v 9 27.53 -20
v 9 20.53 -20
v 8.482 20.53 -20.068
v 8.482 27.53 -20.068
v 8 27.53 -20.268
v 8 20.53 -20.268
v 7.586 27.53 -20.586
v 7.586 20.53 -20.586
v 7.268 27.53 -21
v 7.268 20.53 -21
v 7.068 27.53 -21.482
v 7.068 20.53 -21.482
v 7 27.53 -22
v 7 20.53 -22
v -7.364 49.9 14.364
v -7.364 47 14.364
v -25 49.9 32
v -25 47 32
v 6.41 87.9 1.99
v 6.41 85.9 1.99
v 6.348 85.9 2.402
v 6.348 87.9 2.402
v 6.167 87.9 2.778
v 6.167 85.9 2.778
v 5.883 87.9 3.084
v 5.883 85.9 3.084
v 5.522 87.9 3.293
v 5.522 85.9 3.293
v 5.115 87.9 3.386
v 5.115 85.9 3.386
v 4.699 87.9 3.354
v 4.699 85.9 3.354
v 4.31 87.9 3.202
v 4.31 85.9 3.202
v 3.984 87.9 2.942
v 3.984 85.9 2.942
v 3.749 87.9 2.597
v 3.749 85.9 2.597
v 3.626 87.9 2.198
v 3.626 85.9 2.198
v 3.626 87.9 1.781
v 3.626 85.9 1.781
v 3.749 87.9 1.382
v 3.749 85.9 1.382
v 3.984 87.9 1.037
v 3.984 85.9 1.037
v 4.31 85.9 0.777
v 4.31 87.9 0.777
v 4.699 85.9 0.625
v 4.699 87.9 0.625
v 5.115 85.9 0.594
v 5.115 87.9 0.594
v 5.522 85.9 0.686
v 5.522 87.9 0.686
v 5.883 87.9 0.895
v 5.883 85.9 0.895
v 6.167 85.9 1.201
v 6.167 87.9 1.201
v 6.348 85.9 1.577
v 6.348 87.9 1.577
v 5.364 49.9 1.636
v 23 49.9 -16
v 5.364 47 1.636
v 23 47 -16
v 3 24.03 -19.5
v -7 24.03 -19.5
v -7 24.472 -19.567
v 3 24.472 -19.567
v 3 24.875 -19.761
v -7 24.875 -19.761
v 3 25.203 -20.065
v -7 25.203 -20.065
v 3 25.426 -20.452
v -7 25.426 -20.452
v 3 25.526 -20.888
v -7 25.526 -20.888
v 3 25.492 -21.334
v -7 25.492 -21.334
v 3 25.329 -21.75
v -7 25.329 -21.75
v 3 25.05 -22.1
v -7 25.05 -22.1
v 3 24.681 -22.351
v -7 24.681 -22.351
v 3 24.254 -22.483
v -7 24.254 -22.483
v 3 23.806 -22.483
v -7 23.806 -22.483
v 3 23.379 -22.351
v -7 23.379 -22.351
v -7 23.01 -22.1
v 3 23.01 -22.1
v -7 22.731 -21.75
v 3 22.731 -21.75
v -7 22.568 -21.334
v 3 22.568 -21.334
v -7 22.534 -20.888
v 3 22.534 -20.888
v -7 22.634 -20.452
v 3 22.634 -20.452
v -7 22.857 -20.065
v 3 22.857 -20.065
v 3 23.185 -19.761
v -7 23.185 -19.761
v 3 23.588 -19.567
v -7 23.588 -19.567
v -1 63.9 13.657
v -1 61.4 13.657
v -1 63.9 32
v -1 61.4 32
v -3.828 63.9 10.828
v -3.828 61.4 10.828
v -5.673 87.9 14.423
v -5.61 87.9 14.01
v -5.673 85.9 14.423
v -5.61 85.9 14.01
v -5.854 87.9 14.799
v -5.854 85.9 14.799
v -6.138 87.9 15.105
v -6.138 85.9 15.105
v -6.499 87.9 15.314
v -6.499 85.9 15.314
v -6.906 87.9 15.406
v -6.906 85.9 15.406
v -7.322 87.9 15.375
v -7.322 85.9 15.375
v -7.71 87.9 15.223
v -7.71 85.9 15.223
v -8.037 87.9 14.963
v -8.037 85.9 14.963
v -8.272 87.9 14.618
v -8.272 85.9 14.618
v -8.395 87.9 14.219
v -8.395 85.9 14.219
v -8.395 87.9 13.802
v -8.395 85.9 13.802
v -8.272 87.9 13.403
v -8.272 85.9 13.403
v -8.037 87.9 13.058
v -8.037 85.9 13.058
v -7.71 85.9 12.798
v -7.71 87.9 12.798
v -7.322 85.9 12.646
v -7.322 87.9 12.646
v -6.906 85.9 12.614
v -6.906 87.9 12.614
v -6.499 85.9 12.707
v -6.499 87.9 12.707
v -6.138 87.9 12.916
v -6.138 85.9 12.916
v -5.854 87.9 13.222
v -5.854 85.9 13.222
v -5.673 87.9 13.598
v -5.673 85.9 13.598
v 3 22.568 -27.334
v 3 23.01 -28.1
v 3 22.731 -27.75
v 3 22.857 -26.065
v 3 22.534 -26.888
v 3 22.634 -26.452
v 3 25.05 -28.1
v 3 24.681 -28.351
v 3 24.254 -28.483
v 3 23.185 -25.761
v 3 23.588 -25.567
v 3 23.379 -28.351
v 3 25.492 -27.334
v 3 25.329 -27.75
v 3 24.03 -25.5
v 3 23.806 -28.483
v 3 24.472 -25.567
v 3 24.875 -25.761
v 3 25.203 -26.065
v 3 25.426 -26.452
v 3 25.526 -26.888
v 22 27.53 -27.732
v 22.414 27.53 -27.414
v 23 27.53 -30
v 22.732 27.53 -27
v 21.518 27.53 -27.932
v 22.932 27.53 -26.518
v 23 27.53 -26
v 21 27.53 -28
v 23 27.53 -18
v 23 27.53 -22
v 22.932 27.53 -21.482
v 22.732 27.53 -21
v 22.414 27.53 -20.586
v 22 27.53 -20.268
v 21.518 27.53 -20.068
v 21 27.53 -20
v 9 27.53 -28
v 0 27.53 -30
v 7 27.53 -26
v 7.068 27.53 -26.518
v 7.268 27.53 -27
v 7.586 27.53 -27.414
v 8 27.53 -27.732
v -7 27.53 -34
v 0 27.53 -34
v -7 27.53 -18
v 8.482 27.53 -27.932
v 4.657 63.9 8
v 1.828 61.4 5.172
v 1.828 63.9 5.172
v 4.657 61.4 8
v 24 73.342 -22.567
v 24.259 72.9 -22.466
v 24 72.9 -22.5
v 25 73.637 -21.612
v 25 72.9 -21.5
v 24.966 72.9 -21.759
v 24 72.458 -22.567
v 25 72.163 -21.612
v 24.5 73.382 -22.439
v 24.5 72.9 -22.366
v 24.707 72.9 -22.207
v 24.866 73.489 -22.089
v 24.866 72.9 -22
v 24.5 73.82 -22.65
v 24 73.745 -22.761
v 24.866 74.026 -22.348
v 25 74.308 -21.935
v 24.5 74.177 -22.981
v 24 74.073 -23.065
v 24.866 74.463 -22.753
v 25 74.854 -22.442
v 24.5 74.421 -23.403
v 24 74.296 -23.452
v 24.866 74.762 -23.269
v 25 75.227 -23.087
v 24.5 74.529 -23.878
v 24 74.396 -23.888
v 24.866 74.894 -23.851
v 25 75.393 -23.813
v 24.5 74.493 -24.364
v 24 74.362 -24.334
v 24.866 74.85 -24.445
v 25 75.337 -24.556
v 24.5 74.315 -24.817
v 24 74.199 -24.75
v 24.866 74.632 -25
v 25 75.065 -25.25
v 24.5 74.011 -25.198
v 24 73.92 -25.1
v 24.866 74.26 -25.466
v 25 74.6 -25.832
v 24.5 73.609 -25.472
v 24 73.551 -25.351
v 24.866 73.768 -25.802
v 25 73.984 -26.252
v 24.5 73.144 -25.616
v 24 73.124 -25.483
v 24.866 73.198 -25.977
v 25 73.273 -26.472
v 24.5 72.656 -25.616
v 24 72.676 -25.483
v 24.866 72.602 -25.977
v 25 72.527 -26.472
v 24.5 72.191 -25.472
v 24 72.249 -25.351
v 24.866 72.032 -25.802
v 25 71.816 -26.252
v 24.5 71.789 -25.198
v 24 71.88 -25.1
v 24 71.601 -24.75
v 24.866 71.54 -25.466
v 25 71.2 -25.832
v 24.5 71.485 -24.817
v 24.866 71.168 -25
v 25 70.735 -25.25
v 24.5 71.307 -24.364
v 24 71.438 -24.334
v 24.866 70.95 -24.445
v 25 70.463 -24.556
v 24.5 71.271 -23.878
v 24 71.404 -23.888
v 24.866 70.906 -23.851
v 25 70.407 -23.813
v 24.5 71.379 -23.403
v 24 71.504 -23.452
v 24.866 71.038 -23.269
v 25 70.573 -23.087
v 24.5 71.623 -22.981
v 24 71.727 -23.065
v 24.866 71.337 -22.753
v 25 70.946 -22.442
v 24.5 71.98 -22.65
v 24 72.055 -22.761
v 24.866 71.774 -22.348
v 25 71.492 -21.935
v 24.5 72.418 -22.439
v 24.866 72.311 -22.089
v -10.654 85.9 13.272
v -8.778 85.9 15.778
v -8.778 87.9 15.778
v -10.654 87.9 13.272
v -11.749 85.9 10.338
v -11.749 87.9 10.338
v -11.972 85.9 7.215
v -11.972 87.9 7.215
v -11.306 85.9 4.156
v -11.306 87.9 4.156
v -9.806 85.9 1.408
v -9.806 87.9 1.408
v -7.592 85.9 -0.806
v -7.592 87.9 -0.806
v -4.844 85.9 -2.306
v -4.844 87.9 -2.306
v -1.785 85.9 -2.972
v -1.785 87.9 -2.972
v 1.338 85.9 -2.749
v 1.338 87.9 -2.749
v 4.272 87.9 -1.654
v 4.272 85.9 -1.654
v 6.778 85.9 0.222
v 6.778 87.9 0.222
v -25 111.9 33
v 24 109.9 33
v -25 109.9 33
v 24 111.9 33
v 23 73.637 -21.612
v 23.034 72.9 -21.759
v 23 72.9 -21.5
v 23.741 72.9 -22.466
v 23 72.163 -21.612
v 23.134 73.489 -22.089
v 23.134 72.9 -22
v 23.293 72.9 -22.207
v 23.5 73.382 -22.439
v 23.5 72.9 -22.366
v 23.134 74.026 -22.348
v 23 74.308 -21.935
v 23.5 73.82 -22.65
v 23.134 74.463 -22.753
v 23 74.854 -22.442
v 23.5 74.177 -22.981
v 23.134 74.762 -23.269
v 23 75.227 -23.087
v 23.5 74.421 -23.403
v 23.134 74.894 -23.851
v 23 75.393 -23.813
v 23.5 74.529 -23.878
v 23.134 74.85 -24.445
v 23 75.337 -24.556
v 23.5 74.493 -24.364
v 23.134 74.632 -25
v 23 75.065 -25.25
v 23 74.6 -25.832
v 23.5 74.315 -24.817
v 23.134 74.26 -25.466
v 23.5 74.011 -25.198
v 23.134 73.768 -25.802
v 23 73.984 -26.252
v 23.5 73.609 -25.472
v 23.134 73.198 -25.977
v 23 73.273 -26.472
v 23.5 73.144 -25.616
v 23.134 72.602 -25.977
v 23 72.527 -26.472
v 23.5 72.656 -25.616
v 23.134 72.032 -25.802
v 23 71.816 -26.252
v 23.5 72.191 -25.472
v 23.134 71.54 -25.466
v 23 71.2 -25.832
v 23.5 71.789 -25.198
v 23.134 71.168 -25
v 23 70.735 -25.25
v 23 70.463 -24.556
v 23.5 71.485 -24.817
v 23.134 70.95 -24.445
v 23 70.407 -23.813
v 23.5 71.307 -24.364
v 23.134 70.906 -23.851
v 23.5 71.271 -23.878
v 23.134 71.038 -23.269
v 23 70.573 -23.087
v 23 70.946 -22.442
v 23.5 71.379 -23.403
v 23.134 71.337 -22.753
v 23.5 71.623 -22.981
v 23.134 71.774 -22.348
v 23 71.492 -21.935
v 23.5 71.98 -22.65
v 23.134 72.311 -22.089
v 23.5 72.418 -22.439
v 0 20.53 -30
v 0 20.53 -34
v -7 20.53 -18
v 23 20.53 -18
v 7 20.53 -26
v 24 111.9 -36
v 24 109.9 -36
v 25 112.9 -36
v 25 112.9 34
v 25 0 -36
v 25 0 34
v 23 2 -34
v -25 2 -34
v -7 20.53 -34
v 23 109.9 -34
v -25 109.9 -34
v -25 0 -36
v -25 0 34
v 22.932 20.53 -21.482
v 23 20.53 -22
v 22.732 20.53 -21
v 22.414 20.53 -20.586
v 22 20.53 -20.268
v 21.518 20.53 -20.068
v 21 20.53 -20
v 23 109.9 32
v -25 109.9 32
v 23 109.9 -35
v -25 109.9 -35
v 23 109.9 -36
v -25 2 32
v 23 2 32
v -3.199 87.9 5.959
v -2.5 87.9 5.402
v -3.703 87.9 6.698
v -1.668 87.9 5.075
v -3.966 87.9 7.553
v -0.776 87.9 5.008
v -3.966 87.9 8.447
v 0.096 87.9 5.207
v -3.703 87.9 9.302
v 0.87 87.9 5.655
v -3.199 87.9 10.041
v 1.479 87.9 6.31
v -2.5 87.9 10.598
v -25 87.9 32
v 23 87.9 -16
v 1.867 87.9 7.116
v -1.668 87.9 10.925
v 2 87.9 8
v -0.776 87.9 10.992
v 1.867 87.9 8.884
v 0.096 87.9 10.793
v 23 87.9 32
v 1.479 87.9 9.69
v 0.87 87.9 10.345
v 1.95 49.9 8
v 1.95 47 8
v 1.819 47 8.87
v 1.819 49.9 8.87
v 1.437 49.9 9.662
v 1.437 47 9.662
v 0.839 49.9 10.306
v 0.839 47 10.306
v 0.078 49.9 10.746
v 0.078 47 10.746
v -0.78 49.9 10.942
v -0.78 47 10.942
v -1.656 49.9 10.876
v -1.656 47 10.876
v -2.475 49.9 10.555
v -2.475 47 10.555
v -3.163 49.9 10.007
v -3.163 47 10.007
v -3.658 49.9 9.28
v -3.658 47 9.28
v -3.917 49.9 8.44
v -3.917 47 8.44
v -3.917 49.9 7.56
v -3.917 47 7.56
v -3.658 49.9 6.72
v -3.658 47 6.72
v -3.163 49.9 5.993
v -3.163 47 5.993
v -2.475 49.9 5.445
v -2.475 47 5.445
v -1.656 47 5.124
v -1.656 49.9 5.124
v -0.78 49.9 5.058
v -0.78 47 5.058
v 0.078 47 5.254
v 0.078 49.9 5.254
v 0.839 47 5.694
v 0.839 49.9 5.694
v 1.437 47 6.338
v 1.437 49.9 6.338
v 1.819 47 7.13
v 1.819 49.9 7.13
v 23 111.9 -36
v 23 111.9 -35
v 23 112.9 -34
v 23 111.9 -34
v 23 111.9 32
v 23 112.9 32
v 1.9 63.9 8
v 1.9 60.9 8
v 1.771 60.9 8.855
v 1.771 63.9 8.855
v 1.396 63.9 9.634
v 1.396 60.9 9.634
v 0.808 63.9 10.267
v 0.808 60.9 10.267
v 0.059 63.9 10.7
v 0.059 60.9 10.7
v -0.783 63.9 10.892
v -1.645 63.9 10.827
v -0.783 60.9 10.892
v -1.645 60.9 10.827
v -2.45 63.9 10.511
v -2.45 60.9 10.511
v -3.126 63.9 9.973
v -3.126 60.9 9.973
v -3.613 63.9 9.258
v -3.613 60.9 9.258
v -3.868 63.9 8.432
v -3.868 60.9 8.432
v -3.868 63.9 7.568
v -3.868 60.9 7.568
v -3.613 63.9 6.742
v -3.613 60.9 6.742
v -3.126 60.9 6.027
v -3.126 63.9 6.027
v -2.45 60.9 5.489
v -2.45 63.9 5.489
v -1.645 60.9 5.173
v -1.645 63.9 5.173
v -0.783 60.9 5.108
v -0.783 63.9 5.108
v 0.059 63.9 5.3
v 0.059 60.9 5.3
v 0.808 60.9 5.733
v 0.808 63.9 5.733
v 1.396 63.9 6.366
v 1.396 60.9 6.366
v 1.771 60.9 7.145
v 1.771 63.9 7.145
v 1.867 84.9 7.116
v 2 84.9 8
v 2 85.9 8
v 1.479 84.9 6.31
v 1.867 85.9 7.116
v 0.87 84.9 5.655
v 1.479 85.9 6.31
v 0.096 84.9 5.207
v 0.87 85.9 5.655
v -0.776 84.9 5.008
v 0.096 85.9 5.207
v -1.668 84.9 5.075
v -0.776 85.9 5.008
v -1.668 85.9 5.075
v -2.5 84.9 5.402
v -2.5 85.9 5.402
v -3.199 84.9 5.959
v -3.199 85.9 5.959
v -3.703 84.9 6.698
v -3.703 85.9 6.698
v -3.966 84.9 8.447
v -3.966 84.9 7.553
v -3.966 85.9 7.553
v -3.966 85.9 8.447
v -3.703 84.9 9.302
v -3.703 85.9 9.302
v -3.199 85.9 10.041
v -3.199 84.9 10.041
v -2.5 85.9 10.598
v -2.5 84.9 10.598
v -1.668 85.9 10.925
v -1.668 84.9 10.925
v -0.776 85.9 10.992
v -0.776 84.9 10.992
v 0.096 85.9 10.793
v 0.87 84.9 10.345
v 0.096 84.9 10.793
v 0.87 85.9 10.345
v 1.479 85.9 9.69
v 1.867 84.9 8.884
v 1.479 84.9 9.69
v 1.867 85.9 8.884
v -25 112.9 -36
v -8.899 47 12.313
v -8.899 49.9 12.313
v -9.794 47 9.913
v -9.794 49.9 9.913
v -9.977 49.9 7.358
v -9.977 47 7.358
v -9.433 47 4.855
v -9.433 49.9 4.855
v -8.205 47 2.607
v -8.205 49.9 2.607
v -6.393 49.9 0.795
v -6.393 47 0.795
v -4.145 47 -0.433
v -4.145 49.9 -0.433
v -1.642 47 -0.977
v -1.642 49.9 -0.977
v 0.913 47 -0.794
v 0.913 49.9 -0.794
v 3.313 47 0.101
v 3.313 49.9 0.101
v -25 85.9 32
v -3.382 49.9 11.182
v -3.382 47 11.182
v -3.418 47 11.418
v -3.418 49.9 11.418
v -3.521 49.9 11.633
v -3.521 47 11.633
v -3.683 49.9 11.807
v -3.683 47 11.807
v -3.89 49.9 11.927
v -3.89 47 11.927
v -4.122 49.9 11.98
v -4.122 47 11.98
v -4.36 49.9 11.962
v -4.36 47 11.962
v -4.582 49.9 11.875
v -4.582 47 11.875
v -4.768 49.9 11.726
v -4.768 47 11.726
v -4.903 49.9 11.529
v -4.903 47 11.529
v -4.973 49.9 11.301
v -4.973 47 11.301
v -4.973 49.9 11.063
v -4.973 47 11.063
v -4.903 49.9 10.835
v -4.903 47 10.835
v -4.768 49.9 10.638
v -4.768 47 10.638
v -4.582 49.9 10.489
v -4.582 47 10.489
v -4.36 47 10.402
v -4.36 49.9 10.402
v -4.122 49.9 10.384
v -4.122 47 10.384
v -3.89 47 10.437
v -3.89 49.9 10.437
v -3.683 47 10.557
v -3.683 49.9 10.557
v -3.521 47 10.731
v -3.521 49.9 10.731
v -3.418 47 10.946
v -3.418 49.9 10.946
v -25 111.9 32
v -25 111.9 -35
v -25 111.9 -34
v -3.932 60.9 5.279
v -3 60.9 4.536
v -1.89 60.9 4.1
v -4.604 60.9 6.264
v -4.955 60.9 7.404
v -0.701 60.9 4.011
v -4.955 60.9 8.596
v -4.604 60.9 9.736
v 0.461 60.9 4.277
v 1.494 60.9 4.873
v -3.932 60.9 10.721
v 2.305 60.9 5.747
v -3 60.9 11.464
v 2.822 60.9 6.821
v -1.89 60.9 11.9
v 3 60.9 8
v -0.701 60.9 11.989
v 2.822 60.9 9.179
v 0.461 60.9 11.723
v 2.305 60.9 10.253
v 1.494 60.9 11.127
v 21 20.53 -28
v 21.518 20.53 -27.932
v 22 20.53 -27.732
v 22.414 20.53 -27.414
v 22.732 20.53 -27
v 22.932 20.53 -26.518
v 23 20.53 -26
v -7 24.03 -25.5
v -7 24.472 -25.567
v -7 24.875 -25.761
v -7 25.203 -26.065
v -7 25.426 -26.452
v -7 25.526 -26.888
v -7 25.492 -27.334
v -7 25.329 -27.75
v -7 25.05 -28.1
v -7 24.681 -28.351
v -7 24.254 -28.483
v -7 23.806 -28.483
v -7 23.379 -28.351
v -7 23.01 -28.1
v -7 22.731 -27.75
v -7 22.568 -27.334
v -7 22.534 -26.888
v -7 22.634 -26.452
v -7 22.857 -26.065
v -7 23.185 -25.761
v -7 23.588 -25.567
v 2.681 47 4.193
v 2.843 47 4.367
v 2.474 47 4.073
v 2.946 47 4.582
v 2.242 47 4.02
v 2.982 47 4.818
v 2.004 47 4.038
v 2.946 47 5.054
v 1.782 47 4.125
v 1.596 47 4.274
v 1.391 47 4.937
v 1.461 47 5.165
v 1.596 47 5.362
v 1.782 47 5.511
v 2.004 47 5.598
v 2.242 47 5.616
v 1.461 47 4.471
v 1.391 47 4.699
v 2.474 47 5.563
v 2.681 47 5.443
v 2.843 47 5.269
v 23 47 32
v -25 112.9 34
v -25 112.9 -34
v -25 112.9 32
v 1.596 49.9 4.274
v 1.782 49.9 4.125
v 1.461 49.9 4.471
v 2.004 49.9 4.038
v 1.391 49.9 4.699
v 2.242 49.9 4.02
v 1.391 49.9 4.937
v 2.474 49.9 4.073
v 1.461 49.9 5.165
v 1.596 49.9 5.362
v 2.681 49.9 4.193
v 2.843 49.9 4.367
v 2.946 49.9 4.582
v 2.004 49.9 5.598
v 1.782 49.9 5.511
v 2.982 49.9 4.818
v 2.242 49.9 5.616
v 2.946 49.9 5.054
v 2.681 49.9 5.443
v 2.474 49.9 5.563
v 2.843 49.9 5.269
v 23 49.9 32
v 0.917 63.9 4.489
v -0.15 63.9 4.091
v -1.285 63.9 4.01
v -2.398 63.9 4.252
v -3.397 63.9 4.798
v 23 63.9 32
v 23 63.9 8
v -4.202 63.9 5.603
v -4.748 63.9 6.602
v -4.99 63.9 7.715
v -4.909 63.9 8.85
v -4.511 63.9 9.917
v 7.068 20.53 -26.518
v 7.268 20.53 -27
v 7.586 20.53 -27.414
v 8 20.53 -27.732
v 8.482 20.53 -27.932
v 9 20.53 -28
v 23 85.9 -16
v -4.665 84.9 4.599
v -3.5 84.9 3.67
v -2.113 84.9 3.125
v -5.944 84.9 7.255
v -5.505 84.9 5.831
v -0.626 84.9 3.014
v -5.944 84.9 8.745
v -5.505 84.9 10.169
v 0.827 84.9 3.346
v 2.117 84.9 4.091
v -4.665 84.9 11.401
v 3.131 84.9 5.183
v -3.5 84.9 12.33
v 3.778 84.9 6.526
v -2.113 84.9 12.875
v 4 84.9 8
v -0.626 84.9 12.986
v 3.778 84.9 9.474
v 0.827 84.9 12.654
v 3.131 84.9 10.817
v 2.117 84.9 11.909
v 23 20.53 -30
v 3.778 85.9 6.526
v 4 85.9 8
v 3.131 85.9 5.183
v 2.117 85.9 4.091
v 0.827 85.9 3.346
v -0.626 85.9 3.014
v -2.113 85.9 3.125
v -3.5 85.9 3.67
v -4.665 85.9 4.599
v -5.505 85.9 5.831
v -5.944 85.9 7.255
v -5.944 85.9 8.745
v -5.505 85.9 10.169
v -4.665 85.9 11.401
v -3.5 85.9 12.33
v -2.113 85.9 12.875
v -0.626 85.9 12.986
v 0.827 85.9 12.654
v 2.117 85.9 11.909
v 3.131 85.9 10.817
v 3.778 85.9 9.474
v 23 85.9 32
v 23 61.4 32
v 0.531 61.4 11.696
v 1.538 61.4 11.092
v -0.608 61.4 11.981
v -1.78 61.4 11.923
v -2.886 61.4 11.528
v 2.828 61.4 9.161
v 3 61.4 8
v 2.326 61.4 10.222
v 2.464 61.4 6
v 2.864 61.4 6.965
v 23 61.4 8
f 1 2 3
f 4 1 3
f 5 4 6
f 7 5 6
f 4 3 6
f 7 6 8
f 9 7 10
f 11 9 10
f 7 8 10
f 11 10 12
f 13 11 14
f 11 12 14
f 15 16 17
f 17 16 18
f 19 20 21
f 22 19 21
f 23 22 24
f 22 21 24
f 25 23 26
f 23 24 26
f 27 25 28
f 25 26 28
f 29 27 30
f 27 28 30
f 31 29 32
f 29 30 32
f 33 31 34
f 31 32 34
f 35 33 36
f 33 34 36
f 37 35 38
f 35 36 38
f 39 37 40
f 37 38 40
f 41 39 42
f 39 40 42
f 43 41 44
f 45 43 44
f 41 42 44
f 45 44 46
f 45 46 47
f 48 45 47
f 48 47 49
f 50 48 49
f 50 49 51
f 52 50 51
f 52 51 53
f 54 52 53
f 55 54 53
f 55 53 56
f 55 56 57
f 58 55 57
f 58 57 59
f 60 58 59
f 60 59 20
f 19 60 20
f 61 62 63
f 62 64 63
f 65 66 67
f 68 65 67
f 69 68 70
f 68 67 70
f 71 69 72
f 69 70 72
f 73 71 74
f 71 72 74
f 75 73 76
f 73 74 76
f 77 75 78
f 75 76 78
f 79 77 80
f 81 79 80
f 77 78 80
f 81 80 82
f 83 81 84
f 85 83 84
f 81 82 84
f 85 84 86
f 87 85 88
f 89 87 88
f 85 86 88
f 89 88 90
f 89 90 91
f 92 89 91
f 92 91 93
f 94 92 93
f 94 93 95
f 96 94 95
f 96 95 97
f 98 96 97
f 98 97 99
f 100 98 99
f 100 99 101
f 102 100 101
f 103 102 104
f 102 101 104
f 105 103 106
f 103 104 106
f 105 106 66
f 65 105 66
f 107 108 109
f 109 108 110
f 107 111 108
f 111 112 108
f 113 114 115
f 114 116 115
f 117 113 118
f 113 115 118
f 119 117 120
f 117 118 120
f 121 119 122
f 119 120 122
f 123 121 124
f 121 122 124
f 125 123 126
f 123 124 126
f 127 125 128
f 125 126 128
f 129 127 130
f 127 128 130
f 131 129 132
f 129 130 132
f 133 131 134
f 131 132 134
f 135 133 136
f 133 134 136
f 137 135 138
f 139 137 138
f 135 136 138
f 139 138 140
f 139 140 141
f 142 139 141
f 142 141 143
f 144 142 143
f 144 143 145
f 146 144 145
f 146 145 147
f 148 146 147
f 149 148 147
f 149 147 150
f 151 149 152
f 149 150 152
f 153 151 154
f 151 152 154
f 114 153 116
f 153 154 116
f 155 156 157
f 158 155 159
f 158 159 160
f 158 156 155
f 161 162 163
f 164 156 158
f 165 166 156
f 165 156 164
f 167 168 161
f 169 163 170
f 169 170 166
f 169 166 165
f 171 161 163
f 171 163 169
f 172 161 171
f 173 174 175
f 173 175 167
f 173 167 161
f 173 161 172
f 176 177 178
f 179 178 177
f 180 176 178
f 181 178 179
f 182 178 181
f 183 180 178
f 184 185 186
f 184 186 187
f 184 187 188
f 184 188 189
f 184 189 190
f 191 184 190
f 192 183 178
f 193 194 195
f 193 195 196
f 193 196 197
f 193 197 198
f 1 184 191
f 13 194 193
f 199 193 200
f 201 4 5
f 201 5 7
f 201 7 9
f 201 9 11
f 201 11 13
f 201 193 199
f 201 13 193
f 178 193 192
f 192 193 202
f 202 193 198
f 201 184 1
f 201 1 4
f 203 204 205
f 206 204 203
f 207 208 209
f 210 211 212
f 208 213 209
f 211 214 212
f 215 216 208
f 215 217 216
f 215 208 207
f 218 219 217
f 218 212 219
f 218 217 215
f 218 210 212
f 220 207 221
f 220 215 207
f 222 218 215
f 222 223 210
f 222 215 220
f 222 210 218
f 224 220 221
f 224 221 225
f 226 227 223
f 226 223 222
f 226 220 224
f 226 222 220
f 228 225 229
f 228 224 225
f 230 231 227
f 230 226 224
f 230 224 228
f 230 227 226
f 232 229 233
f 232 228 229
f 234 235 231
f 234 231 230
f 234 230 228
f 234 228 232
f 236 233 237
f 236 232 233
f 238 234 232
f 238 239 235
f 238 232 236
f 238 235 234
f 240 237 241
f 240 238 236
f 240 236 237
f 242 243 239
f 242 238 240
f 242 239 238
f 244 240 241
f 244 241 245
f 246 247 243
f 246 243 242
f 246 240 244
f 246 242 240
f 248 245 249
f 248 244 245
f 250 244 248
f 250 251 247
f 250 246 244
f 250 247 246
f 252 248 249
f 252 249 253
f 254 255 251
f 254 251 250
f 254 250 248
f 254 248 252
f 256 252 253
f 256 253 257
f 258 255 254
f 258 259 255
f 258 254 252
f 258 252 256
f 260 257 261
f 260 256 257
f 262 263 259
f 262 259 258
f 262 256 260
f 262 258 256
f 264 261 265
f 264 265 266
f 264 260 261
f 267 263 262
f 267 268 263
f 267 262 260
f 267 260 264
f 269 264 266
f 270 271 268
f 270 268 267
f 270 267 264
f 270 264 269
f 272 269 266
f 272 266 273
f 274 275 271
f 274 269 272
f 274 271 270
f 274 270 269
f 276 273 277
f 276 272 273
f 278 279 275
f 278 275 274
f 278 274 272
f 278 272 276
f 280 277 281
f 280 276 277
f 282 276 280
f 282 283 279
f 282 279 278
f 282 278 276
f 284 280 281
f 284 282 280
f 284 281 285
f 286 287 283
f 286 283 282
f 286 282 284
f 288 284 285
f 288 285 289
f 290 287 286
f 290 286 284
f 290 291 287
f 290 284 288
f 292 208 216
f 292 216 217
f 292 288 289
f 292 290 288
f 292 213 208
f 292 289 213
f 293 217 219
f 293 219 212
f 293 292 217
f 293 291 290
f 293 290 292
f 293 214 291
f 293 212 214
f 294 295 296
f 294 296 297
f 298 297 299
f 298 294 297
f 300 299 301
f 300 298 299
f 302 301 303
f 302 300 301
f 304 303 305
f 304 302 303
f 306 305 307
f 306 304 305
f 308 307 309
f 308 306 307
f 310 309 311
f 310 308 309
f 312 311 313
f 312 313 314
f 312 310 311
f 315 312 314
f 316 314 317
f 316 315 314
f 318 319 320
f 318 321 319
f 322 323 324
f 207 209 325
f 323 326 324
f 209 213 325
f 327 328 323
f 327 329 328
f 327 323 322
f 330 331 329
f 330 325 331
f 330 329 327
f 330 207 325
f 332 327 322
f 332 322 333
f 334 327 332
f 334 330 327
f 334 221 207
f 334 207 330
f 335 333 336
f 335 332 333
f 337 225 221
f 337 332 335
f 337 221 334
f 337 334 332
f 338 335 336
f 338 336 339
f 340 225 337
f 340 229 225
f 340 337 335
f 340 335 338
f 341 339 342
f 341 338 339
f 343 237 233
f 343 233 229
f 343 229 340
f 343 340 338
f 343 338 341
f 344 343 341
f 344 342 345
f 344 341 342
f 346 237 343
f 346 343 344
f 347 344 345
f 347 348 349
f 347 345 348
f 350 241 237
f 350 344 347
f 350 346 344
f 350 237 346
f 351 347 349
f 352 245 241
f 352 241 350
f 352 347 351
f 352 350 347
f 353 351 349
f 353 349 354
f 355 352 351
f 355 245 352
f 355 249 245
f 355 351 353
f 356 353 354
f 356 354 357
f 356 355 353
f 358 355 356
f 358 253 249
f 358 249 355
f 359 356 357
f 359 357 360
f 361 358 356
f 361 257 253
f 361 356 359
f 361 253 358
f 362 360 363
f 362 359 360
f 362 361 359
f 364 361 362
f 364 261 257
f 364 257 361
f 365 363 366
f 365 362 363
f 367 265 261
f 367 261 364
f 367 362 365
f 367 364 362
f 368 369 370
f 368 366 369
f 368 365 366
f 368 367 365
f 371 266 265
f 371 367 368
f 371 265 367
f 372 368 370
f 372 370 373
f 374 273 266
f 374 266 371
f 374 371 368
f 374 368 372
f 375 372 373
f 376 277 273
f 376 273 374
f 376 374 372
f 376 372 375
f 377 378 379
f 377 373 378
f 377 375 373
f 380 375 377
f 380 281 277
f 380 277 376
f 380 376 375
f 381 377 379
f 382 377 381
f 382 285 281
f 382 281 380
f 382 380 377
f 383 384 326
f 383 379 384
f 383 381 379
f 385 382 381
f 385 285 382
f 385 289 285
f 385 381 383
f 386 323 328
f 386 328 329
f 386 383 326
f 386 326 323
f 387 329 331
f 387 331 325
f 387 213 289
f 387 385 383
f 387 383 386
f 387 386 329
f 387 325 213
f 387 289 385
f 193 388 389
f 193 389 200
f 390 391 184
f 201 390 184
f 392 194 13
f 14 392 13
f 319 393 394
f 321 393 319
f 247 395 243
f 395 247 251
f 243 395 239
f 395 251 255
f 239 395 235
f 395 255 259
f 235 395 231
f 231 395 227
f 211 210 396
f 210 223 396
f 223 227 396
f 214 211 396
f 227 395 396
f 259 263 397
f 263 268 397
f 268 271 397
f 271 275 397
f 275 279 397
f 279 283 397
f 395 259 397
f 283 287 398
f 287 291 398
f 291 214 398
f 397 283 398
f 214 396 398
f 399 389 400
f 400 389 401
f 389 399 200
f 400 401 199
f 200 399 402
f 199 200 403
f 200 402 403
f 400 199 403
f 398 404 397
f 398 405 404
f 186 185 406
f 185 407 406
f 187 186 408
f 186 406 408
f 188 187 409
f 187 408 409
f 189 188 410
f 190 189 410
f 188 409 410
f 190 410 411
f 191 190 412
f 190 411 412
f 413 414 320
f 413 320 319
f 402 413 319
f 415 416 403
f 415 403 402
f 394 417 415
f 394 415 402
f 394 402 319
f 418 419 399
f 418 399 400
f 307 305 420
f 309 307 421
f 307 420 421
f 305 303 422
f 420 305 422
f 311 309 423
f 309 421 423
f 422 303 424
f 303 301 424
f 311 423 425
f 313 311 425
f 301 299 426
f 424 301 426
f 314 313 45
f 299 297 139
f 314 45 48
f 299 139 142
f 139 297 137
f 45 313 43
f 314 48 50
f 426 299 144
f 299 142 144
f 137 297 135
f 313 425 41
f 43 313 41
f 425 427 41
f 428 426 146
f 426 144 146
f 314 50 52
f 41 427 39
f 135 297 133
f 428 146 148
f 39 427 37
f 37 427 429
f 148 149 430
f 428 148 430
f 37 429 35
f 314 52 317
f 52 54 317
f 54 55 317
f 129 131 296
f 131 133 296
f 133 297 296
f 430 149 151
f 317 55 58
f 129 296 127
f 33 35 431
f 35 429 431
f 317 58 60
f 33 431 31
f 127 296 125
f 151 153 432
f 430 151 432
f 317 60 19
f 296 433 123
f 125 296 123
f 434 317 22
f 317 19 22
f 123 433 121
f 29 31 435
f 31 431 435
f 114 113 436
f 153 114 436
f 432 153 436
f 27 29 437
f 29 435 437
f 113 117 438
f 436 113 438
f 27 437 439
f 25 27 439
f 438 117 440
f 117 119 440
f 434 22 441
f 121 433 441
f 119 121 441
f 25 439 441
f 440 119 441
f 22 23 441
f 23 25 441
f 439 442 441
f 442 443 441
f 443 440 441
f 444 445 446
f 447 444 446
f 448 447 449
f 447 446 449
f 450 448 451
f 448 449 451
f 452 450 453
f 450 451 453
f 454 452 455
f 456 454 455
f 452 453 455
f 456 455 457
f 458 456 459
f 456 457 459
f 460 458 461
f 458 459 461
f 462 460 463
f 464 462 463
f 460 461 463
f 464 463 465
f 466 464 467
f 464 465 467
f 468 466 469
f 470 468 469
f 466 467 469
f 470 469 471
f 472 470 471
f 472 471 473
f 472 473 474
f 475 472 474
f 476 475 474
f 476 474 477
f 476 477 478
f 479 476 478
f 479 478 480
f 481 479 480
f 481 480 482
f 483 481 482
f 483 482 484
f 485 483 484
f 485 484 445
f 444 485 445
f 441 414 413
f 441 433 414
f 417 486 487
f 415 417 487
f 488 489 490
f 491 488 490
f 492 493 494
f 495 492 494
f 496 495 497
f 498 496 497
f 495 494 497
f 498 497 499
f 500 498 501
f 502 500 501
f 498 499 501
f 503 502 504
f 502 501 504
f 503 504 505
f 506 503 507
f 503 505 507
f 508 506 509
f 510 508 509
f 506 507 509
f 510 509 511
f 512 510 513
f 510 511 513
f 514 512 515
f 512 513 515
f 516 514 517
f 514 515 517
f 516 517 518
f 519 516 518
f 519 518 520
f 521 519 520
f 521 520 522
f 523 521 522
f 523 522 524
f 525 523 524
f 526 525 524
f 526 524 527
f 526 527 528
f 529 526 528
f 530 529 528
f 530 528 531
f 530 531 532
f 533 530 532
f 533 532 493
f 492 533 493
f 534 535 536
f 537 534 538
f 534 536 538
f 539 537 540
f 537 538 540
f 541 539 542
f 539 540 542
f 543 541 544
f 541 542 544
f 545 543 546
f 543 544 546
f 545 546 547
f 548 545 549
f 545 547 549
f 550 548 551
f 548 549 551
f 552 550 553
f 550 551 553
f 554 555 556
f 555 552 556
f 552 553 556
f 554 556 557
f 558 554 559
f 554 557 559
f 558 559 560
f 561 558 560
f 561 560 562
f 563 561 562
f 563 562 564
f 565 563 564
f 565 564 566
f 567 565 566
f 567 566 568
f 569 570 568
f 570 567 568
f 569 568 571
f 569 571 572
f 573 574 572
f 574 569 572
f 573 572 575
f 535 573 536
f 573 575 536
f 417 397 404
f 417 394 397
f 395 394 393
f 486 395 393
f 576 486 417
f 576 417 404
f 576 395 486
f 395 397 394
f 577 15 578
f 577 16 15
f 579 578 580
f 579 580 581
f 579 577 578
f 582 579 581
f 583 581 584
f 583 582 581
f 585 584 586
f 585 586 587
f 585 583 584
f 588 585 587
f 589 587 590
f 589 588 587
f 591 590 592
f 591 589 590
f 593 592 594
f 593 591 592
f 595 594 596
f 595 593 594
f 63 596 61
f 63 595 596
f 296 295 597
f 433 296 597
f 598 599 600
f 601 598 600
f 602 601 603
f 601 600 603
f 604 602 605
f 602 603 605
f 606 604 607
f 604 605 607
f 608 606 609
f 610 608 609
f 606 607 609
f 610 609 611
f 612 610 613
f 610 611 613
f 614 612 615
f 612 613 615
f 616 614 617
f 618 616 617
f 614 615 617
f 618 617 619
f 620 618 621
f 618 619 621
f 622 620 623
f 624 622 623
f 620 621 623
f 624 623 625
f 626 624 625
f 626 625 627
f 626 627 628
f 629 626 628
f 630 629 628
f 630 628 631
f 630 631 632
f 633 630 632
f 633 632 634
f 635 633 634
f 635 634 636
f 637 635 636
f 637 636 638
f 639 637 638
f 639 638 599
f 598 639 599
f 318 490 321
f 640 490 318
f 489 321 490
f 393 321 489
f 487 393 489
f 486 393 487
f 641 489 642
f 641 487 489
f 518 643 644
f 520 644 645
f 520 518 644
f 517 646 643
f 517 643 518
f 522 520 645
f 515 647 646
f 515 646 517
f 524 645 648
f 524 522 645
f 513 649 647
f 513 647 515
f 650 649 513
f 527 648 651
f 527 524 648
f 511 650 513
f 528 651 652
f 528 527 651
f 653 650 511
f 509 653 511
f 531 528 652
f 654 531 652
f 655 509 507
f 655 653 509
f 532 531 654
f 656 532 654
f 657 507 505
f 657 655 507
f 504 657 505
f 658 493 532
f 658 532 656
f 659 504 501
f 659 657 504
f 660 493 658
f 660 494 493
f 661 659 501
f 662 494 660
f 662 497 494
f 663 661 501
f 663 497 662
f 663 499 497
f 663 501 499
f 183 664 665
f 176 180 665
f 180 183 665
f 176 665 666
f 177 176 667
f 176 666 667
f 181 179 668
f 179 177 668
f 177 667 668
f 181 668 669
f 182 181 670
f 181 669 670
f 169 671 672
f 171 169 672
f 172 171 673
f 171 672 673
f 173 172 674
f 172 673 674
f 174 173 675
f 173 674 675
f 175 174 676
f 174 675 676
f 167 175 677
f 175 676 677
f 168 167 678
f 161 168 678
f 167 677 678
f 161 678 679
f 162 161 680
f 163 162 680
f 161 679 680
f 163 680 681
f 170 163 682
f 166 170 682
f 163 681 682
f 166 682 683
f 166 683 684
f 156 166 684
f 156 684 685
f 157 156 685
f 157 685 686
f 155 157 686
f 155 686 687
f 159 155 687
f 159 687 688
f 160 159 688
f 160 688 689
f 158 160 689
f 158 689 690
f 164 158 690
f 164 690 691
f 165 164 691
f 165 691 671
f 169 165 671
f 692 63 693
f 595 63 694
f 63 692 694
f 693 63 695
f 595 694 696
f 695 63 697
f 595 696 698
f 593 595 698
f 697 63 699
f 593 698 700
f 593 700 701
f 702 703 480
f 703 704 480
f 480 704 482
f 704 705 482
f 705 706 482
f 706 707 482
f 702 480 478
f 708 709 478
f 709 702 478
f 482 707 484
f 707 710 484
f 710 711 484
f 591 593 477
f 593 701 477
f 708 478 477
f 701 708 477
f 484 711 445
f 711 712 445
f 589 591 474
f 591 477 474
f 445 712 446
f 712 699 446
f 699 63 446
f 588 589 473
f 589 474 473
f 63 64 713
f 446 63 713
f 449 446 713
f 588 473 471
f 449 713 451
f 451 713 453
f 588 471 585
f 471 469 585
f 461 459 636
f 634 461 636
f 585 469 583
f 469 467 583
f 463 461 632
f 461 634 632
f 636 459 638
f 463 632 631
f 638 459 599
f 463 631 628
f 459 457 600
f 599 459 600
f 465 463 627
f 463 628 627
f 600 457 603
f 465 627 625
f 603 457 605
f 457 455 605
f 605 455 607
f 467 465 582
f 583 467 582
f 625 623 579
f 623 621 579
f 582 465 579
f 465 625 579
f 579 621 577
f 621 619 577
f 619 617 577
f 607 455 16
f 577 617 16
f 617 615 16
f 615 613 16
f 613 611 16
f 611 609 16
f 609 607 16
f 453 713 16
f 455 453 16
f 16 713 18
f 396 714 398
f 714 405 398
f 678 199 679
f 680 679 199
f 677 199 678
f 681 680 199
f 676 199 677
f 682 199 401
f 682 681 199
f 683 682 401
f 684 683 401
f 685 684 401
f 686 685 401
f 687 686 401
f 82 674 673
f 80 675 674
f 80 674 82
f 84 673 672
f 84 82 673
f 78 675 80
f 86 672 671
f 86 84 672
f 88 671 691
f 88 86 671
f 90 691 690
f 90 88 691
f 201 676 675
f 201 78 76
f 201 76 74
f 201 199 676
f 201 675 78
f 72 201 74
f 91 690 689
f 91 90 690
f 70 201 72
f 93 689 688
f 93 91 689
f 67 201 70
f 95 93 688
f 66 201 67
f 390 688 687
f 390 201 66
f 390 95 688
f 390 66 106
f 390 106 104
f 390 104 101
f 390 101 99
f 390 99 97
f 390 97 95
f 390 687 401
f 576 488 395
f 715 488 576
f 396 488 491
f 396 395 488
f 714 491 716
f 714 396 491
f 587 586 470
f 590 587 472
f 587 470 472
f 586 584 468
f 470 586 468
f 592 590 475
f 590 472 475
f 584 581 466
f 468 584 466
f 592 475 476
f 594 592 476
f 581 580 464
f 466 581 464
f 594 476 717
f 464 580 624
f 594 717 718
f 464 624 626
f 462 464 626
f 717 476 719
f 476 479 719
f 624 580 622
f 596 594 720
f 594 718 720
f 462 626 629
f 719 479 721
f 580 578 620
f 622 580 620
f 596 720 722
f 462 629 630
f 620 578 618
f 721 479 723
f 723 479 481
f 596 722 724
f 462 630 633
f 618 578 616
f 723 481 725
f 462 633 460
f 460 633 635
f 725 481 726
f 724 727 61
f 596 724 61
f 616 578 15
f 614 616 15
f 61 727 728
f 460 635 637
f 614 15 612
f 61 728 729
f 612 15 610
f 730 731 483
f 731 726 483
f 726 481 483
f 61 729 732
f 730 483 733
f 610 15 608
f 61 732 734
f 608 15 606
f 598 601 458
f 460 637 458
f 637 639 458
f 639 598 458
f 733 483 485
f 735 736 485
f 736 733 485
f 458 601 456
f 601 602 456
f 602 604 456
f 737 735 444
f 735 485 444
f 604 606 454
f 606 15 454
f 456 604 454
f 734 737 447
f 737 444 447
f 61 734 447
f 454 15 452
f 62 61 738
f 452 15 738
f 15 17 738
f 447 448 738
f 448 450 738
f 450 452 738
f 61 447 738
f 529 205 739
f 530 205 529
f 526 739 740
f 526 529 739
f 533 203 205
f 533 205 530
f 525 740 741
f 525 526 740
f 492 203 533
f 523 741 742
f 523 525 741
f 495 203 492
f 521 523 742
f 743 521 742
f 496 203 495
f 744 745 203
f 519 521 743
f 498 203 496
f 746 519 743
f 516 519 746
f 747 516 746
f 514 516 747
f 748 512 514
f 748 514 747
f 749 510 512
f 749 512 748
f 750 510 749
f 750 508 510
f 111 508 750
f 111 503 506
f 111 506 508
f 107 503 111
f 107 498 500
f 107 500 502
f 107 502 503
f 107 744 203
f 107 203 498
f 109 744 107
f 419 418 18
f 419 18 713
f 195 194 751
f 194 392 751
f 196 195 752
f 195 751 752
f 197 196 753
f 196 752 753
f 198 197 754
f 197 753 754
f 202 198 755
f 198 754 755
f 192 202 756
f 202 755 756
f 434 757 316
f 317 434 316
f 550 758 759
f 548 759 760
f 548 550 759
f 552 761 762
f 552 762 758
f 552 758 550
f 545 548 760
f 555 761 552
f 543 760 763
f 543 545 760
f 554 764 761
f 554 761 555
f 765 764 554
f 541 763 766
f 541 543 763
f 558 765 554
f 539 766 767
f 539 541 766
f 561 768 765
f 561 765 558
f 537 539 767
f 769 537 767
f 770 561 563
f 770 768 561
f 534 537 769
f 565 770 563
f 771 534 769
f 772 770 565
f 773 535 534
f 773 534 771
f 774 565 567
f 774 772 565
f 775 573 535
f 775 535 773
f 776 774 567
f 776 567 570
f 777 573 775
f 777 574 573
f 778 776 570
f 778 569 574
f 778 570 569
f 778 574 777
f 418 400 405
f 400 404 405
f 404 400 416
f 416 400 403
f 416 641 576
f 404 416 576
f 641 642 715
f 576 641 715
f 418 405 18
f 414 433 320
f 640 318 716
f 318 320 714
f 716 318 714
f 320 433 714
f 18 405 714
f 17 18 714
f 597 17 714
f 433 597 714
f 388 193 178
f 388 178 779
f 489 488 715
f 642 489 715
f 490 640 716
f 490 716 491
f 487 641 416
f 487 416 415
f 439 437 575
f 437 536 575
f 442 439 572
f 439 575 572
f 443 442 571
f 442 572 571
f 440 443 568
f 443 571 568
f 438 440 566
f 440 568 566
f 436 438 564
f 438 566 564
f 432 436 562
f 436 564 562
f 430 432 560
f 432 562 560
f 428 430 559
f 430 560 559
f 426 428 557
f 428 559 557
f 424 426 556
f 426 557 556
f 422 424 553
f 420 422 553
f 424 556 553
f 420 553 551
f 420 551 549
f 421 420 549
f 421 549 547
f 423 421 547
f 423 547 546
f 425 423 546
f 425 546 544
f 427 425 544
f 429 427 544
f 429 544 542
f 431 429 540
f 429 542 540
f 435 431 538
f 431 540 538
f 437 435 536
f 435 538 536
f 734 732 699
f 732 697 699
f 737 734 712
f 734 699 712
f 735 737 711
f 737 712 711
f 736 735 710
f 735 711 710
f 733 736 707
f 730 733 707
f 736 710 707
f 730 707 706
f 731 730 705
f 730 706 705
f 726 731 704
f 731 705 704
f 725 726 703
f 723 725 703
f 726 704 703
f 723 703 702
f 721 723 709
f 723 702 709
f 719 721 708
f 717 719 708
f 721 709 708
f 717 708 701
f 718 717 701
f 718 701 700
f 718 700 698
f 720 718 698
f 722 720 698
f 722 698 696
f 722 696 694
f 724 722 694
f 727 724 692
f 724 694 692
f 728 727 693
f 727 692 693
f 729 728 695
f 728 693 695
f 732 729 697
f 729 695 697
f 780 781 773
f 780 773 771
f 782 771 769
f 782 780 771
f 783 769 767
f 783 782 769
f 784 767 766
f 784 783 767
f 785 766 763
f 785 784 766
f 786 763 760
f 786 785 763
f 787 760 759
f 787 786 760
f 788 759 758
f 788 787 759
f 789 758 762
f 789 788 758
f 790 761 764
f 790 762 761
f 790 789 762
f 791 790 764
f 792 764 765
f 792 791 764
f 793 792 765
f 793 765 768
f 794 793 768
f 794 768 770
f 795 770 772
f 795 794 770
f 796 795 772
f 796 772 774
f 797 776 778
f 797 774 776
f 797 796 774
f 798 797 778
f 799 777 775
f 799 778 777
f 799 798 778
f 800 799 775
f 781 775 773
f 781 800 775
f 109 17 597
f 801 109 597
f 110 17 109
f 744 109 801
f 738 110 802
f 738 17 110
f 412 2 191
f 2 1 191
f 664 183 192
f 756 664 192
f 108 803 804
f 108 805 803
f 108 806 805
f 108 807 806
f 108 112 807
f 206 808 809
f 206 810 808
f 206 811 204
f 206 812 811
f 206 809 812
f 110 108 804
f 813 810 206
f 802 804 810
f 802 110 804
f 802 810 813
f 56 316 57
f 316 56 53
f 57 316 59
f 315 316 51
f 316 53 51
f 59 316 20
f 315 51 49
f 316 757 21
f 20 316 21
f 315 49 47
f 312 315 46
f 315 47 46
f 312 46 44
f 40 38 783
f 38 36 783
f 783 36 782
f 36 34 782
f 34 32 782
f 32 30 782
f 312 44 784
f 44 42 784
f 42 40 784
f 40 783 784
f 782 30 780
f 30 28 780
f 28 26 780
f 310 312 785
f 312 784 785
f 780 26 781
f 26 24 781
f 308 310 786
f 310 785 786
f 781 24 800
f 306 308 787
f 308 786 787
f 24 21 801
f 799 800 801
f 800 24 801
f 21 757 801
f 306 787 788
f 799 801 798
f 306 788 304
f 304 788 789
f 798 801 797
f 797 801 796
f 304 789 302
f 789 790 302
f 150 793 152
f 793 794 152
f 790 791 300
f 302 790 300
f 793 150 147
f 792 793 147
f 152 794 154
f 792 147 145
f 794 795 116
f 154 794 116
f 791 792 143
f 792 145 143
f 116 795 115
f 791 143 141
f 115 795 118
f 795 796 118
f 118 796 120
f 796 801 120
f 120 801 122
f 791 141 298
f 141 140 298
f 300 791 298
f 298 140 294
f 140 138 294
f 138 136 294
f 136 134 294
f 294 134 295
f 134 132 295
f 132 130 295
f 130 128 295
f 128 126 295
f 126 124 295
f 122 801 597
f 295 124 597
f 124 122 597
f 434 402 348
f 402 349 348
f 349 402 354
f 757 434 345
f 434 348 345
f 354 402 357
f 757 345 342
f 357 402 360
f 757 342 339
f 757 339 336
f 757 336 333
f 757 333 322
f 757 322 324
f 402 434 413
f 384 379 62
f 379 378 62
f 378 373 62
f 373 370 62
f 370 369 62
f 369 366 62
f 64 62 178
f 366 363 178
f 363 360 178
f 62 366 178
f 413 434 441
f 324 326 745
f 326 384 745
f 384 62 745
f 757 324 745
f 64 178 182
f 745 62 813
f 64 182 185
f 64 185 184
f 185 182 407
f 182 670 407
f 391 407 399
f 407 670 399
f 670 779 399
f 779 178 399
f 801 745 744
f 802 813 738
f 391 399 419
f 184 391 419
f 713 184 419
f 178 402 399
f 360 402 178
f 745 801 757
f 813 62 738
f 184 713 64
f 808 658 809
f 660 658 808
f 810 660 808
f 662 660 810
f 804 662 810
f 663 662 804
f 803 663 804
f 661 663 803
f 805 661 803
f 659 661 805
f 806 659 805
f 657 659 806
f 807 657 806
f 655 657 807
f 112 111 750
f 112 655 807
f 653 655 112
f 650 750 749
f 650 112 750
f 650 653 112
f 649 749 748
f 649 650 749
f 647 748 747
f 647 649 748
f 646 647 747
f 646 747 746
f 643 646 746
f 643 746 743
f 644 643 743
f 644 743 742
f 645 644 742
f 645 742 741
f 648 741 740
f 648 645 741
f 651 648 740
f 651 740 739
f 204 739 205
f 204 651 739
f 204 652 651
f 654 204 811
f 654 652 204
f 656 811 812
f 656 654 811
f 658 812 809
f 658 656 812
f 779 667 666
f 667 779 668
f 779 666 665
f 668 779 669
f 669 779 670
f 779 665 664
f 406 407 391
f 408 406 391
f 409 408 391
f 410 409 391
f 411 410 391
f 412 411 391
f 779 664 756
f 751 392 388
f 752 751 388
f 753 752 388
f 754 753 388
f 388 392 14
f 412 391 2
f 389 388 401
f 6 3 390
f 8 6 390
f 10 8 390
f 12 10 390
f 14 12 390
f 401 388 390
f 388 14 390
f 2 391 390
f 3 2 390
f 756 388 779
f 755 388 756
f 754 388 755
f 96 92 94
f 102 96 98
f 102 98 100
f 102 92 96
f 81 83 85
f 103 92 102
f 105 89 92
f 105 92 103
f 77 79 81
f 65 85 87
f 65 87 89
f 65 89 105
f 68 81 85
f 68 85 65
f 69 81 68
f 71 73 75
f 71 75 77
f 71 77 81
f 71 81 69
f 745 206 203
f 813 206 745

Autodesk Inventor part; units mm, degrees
ref_plane "YZ Plane" through (0, 0, 0) normal (1, 0, 0) x (0, 1, 0)
ref_plane "XZ Plane" through (0, 0, 0) normal (0, 1, 0) x (-1, 0, 0)
ref_plane "XY Plane" through (0, 0, 0) normal (0, 0, 1) x (1, 0, 0)
sketch "Sketch1" plane through (0, 0, 0) normal (0, 1, 0) x (-1, 0, 0)
  line L0 (25, 34) -> (-25, 34)
  line L1 (-25, 34) -> (-25, -34)
  line L2 (-25, -34) -> (25, -34)
  line L3 (25, -34) -> (25, 34)
  line L4 (25, 34) -> (-25, -34) construction
  line L5 (-25, 34) -> (25, -34) construction
  point P0 (0, 0)
  dimension "d0" = 68
  dimension "d1" = 50
extrude "left wall" add sketch "Sketch1" along normal blind 2
sketch "Sketch3" plane through (0, 2, 0) normal (0, 1, 0) x (1, 0, 0)
  line L0 (25, -34) -> (25, 34) projected
  line L1 (-25, 34) -> (-25, -34) projected
  line L2 (25, -34) -> (-25, -34)
  line L3 (-25, -34) -> (-25, -32)
  line L4 (-25, -32) -> (25, -32)
  line L5 (25, -32) -> (25, -34)
  point P0 (0, 0)
  dimension "d4" = 2
extrude "bottom wall" add sketch "Sketch3" along normal blind 110.9
sketch "Sketch10" plane through (-25, 2, 32) normal (0, 0, -1) x (-1, 0, 0)
  line L0 (0, 0) -> (0, 110.9) projected
  line L1 (-50, 0) -> (-50, 110.9) projected
  line L2 (0, 58.9) -> (-50, 58.9)
  line L3 (-50, 58.9) -> (-50, 61.9)
  line L4 (-50, 61.9) -> (0, 61.9)
  line L5 (0, 61.9) -> (0, 58.9)
  line L6 (-50, 0) -> (0, 0) projected
  point P0 (-25, -2)
  point P1 (0, 61.9)
  point P2 (-50, 58.9)
  dimension "d33" = 3
  dimension "d34" = 58.9
extrude "mid wall" add sketch "Sketch10" along normal blind 48 contours L2 L1 L4 L0
sketch "Sketch11" plane through (-25, 60.9, 32) normal (0, -1, 0) x (1, 0, 0)
  circle A0 centre (24, -24) radius 2.9
  line L0 (0, 0) -> (0, -48) projected
  line L1 (0, -48) -> (50, -48) projected
  dimension "d37" = 5.8
  dimension "d136" = 24
  dimension "d137" = 24
extrude "middle bearing hole" cut sketch "Sketch11" against normal blind 48
sketch "Sketch15" plane through (0, 2, 0) normal (0, 1, 0) x (1, 0, 0)
  line L0 (25, 34) -> (-25, 34) projected
  line L1 (-25, -32) -> (25, -32) projected
  line L2 (25, 34) -> (23, 34)
  line L3 (23, 34) -> (23, -32)
  line L4 (23, -32) -> (25, -32)
  line L5 (25, -32) -> (25, 34)
  point P0 (0, 0)
  point P1 (25, -32)
  dimension "d69" = 2
extrude "back wall" add sketch "Sketch15" along normal blind 110.9
sketch "Sketch20" plane through (-25, 60.9, -16) normal (0, -1, 0) x (1, 0, 0)
  circle A0 centre (24, 24) radius 4
  line L0 (0, 48) -> (48, 48) projected
  line L1 (48, -18) -> (0, -18)
  line L2 (0, -18) -> (0, 48)
  line L3 (0, 48) -> (48, 48)
  line L4 (48, 48) -> (48, -18)
  line L5 (0, 0) -> (48, 0) projected
  point P0 (25, 16)
  point P1 (48, 48)
  point P2 (24, 0)
  dimension "d106" = 8
  dimension "d138" = 24
  dimension "d139" = 24
extrude "thicker mid wall ring for bearing" cut sketch "Sketch20" against normal blind 0.5
sketch "Sketch21" plane through (23, 2, 32) normal (0, 0, -1) x (-1, 0, 0)
  line L0 (0, 0) -> (0, 59.4) projected
  line L1 (48, -2) -> (48, 110.9) projected
  line L2 (0, 45) -> (48, 45)
  line L3 (48, 45) -> (48, 47.9)
  line L4 (48, 47.9) -> (0, 47.9)
  line L5 (0, 47.9) -> (0, 45)
  line L6 (0, 0) -> (48, 0) projected
  point P0 (23, -2)
  dimension "d110" = 45
  dimension "d111" = 2.9
extrude "motor attachment wall" add sketch "Sketch21" along normal up to surface (66 mm away) contours L0 L4 L1 L2
sketch "Sketch24" plane through (-25, 47, 32) normal (0, -1, 0) x (1, 0, 0)
  circle A0 centre (24, -24) radius 2.95
  circle A1 centre (20.818, -20.818) radius 0.8
  circle A2 centre (27.182, -27.182) radius 0.8
  line L0 (48, -66) -> (48, 0) projected
  line L1 (0, 0) -> (0, -66) projected
  line L2 (48, 0) -> (0, 0)
  line L3 (0, 0) -> (0, -48)
  line L4 (0, -48) -> (48, -48)
  line L5 (48, -48) -> (48, 0)
  line L6 (48, -48) -> (0, 0)
  point P0 (25, 14.5)
  dimension "d119" = 5.9
  dimension "d125" = 48
  dimension "d126" = 62.5
  dimension "d127" = 24
  dimension "d128" = 24
  dimension "d131" = 1.6
  dimension "d132" = 4.5
  dimension "d133" = 4.5
extrude "motor holes" cut sketch "Sketch24" against normal up to surface (2.9 mm away) contours A0 L6 | L6 A0 | L6 A1 | A1 L6 | L6 A2 | A2 L6
sketch "Sketch25" plane through (-25, 47, 32) normal (0, -1, 0) x (1, 0, 0)
  line L0 (48, -48) -> (0, 0)
  line L1 (0, 0) -> (0, -66) projected
  line L2 (0, 0) -> (0, -66)
  line L3 (48, -66) -> (0, -66) projected
  circle A0 centre (24, -24) radius 2.95 projected
  circle A1 centre (24, -24) radius 9
  line L4 (48, -48) -> (0, -48) projected
  line L5 (48, -48) -> (48, -66)
  line L6 (50, 2) -> (50, -66) projected
  line L7 (0, 0) -> (0, 2) projected
  line L8 (0, -66) -> (0, 0)
  point P0 (25, -32)
  point P1 (30.364, -30.364)
  point P2 (17.636, -17.636)
  dimension "d134" = 18
extrude "motor attachment wall cut out" cut sketch "Sketch25" against normal blind 3.075 contours L4 L1 L0 A1 | L5 L3 L1 L4
sketch "Sketch26" plane through (-25, 61.4, -16) normal (0, -1, 0) x (1, 0, 0)
  line L0 (48, 0) -> (0, 48)
  circle A0 centre (24, 24) radius 4
  circle A1 centre (24, 24) radius 2.9 projected
  line L1 (0, 0) -> (48, 0) projected
  line L2 (48, 0) -> (0, 0)
  line L3 (0, 48) -> (0, 50) projected
  line L4 (0, 0) -> (0, 48)
  line L5 (24, 24) -> (48, 24)
  line L6 (48, 48) -> (48, 0) projected
  line L7 (24, 24) -> (24, 48)
  line L8 (48, 48) -> (0, 48) projected
  line L9 (21.1716, 26.8284) -> (24, 29.6569)
  line L10 (26.8284, 21.1716) -> (29.6569, 24)
  point P0 (25, -38)
  point P1 (24, 28)
  dimension "d140" = 8
extrude "mid wall cut out" cut sketch "Sketch26" against normal blind 3.075 contours L1 L4 L0 A0 | L0 L10 L5 L6 | L0 L8 L7 L9
sketch "Sketch27" plane through (23, 112.9, 32) normal (0, 0, -1) x (-1, 0, 0)
  line L0 (0, 0) -> (0, -49) projected
  line L1 (48, -112.9) -> (48, 0) projected
  line L2 (0, -27) -> (48, -27)
  line L3 (48, -27) -> (48, -25)
  line L4 (48, -25) -> (0, -25)
  line L5 (0, -25) -> (0, -27)
  line L6 (0, -110.9) -> (48, -110.9) projected
  point P0 (23, -112.9)
  point P1 (0, -25)
  dimension "d144" = 83.9
  dimension "d145" = 2
extrude "encoder wall" add sketch "Sketch27" along normal blind 48
sketch "Sketch28" plane through (-25, 85.9, 32) normal (0, -1, 0) x (1, 0, 0)
  line L0 (48, -48) -> (48, 0) projected
  line L1 (0, 0) -> (0, 2) projected
  line L2 (48, -48) -> (0, 0)
  circle A0 centre (24, -24) radius 3
  circle A1 centre (30.0104, -30.0104) radius 1.4
  circle A2 centre (17.9896, -17.9896) radius 1.4
  dimension "d153" = 6
  dimension "d154" = 8.5
  dimension "d155" = 8.5
  dimension "d156" = 2.8
  dimension "d157" = 2.8
extrude "encoder holes" cut sketch "Sketch28" against normal blind 48
sketch "Sketch29" plane through (-25, 85.9, 32) normal (0, -1, 0) x (1, 0, 0)
  line L0 (0, -48) -> (48, -48) projected
  line L1 (48, 0) -> (0, 0) projected
  line L2 (48, -48) -> (0, 0)
  circle A0 centre (24, -24) radius 11
  line L3 (0, 0) -> (0, 2) projected
  line L4 (0, 0) -> (0, -48)
  line L5 (0, -48) -> (48, -48)
  point P0 (25, -32)
  point P1 (31.7782, -31.7782)
  point P2 (16.2218, -16.2218)
  dimension "d160" = 22
extrude "encoder wall cut out" cut sketch "Sketch29" against normal blind 48 contours L4 L2 A0 L0
sketch "Sketch30" plane through (25, 0, -34) normal (0, 0, -1) x (-1, 0, 0)
  line L0 (2, 112.9) -> (50, 112.9) projected
  line L1 (50, 0) -> (0, 0) projected
  line L2 (50, 112.9) -> (0, 112.9)
  line L3 (0, 112.9) -> (0, 0)
  line L4 (0, 0) -> (50, 0)
  line L5 (50, 0) -> (50, 112.9)
  point P0 (25, 0)
extrude "top" add sketch "Sketch30" along normal blind 2
sketch "Sketch31" plane through (25, 0, -34) normal (0, 0, 1) x (1, 0, 0)
  point P0 (-25, 0)
sketch "Sketch32" plane through (25, 0, -34) normal (0, 0, 1) x (1, 0, 0)
  line L0 (-50, 0) -> (-50, 112.9) projected
  line L1 (0, 112.9) -> (0, 0) projected
  line L2 (-50, 111.9) -> (-1, 111.9)
  line L3 (-1, 111.9) -> (-1, 109.9)
  line L4 (-1, 109.9) -> (-50, 109.9)
  line L5 (-50, 109.9) -> (-50, 111.9)
  line L6 (-50, 112.9) -> (0, 112.9) projected
  point P0 (-25, 0)
  point P1 (0, 112.9)
  dimension "d165" = 1
  dimension "d166" = 2
  dimension "d177" = 1
extrude "top rightWallGroove" cut sketch "Sketch32" against normal blind 1
sketch "Sketch33" plane through (23, 2, 32) normal (-1, 0, 0) x (0, 0, 1)
  line L0 (-78, 107.9) -> (-78, 104.9)
  line L1 (0, 110.9) -> (0, 85.9) projected
  line L2 (-78, 107.9) -> (0, 107.9)
  line L3 (0, 107.9) -> (0, 109.9)
  line L4 (0, 109.9) -> (-78, 109.9)
  line L5 (-78, 109.9) -> (-78, 107.9)
  line L6 (-66, 110.9) -> (0, 110.9) projected
  point P0 (-32, -2)
  point P1 (-78, 109.9)
  point P2 (0, 107.9)
  dimension "d169" = 2
  dimension "d178" = 1
extrude "back rightWallGroove" cut sketch "Sketch33" against normal blind 1
sketch "Sketch34" plane through (23, 112.9, 32) normal (0, 0, -1) x (-1, 0, 0)
  line L0 (48, -112.9) -> (48, 0) projected
  line L1 (48, -3) -> (-1, -3)
  line L2 (-1, -3) -> (-1, -1)
  line L3 (-1, -1) -> (48, -1)
  line L4 (48, -1) -> (48, -3)
  line L5 (48, 0) -> (-2, 0) projected
  line L6 (-2, -112.9) -> (-2, 0) projected
  point P0 (23, -112.9)
  point P1 (-1, -2)
  point P2 (48, -1)
  dimension "d172" = 1
  dimension "d173" = 2
  dimension "d174" = 1
extrude "bottom rightWallGroove" cut sketch "Sketch34" against normal blind 1
sketch "Sketch35" plane through (-25, 85.9, 32) normal (0, -1, 0) x (1, 0, 0)
  circle A0 centre (24, -24) radius 3 projected
  circle A1 centre (24, -24) radius 3
  circle A2 centre (24, -24) radius 5
  point P0 (25, -32)
  dimension "d179" = 2
extrude "encoder bearing thicker" add sketch "Sketch35" along normal blind 1
ref_plane "Work Plane4" through (-1, 72.9, 32) normal (0, 1, 0) x (1, 0, 0)
sketch "Sketch38" plane through (23, 2, 32) normal (-1, 0, 0) x (0, 0, 1)
  line L0 (-66, 0) -> (-66, 107.9) projected
  line L1 (-66, 70.9) -> (-23.3371, 70.9)
  line L2 (-66, 0) -> (0, 0) projected
  line L3 (-56, 0) -> (-56, 123.7656)
  line L4 (-48, 45) -> (-48, 47.9) projected
  line L5 (-82, 70.9) -> (16, 70.9) projected
  line L6 (-62, 18.53) -> (-50, 18.53)
  line L7 (-50, 18.53) -> (-50, 25.53)
  line L8 (-50, 25.53) -> (-62, 25.53)
  line L9 (-62, 25.53) -> (-62, 18.53)
  line L10 (-62, 18.53) -> (-50, 25.53) construction
  line L11 (-50, 18.53) -> (-62, 25.53) construction
  circle A0 centre (-56, 70.9) radius 1.5
  point P0 (-32, -2)
  point P1 (-48, 46.45)
  point P2 (-56, 22.03)
  dimension "d195" = 8
  dimension "d196" = 0
  dimension "d197" = 7
  dimension "d198" = 12
  dimension "d199" = 52.37
  dimension "d202" = 3
extrude "loadcell block" add sketch "Sketch38" along normal blind 30 contours L6 L9 L8 L3 | L3 L8 L7 L6
extrude "wire exit" cut sketch "Sketch38" against normal blind 30 contours A0 L3 L1 | L1 L3 A0 | L3 A0 L1 | L1 A0 L3
sketch "Sketch39" plane through (-7, 2, 32) normal (-1, 0, 0) x (0, 0, 1)
  line L0 (-50, 25.53) -> (-50, 18.53) projected
  line L1 (-50, 22.03) -> (-62, 22.03)
  line L2 (-62, 25.53) -> (-62, 18.53) projected
  line L3 (-62, 18.53) -> (-50, 18.53) projected
  line L4 (-50, 18.53) -> (-62, 18.53) projected
  line L5 (-56, 18.53) -> (-56, 25.53)
  line L6 (-62, 25.53) -> (-50, 25.53) projected
  circle A0 centre (-59, 22.03) radius 1.5
  circle A1 centre (-53, 22.03) radius 1.5
  point P0 (-32, -2)
  dimension "d205" = 3.5
  dimension "d206" = 6
  dimension "d207" = 6
  dimension "d208" = 3
  dimension "d209" = 3
extrude "loadcell screw holes" cut sketch "Sketch39" against normal blind 10 contours A1 L1 | L1 A1 | A0 L1 | L1 A0
sketch "Sketch40" plane through (23, 27.53, -18) normal (0, 1, 0) x (1, 0, 0)
  line L0 (0, -52) -> (0, 16) projected
  line L1 (0, 10) -> (-16, 10)
  line L2 (-16, 10) -> (-16, 2)
  line L3 (-16, 2) -> (0, 2)
  line L4 (0, 2) -> (0, 10)
  line L5 (-30, 0) -> (-30, 12) projected
  line L6 (0, 0) -> (-30, 0) projected
  line L7 (0, 12) -> (-30, 12) projected
  point P0 (-23, -18)
  point P1 (-16, 6)
  point P2 (-30, 6)
  point P3 (0, 2)
  dimension "d215" = 14
  dimension "d216" = 2
  dimension "d217" = 2
extrude "Extrusion32" cut sketch "Sketch40" against normal blind 10 contours L3 L2 L1 L0
fillet "Fillet1" radius 2 4 edges at (7, 24.03, -28) (7, 24.03, -20) (23, 24.03, -20) (23, 24.03, -28)
fillet "Fillet2" radius 1 2 edges at (23, 72.9, -25.5) (25, 72.9, -25.5)
sketch "Sketch41" plane through (23, 20.53, -30) normal (0, 0, -1) x (-1, 0, 0)
  line L0 (0, 0) -> (30, 0) projected
  line L1 (0, 7) -> (30, 7) projected
  line L2 (30, 0) -> (23, 0)
  line L3 (23, 0) -> (23, 7)
  line L4 (23, 7) -> (30, 7)
  line L5 (30, 7) -> (30, 0)
  point P0 (23, -20.53)
  point P1 (23, 3.5)
  point P2 (23, 0)
  dimension "d225" = 7
extrude "load cell block support" add sketch "Sketch41" along normal up to surface (4 mm away)
equation "\"d136\" = d127"
equation "\"d137\" = d136"
equation "\"d69\" = d4"
equation "\"d70\" = d5"
equation "\"d138\" = d136"
equation "\"d139\" = d138"
equation "\"d127\" = 0.5 * d125"
equation "\"d128\" = d127"
equation "\"d133\" = d132"
equation "\"d134\" = 4 * d132"
equation "\"d140\" = d106"
equation "\"d146\" = d125"
equation "\"d5\" = 110.9"
properties part number "motor_maincase1.1_3DPrint"
